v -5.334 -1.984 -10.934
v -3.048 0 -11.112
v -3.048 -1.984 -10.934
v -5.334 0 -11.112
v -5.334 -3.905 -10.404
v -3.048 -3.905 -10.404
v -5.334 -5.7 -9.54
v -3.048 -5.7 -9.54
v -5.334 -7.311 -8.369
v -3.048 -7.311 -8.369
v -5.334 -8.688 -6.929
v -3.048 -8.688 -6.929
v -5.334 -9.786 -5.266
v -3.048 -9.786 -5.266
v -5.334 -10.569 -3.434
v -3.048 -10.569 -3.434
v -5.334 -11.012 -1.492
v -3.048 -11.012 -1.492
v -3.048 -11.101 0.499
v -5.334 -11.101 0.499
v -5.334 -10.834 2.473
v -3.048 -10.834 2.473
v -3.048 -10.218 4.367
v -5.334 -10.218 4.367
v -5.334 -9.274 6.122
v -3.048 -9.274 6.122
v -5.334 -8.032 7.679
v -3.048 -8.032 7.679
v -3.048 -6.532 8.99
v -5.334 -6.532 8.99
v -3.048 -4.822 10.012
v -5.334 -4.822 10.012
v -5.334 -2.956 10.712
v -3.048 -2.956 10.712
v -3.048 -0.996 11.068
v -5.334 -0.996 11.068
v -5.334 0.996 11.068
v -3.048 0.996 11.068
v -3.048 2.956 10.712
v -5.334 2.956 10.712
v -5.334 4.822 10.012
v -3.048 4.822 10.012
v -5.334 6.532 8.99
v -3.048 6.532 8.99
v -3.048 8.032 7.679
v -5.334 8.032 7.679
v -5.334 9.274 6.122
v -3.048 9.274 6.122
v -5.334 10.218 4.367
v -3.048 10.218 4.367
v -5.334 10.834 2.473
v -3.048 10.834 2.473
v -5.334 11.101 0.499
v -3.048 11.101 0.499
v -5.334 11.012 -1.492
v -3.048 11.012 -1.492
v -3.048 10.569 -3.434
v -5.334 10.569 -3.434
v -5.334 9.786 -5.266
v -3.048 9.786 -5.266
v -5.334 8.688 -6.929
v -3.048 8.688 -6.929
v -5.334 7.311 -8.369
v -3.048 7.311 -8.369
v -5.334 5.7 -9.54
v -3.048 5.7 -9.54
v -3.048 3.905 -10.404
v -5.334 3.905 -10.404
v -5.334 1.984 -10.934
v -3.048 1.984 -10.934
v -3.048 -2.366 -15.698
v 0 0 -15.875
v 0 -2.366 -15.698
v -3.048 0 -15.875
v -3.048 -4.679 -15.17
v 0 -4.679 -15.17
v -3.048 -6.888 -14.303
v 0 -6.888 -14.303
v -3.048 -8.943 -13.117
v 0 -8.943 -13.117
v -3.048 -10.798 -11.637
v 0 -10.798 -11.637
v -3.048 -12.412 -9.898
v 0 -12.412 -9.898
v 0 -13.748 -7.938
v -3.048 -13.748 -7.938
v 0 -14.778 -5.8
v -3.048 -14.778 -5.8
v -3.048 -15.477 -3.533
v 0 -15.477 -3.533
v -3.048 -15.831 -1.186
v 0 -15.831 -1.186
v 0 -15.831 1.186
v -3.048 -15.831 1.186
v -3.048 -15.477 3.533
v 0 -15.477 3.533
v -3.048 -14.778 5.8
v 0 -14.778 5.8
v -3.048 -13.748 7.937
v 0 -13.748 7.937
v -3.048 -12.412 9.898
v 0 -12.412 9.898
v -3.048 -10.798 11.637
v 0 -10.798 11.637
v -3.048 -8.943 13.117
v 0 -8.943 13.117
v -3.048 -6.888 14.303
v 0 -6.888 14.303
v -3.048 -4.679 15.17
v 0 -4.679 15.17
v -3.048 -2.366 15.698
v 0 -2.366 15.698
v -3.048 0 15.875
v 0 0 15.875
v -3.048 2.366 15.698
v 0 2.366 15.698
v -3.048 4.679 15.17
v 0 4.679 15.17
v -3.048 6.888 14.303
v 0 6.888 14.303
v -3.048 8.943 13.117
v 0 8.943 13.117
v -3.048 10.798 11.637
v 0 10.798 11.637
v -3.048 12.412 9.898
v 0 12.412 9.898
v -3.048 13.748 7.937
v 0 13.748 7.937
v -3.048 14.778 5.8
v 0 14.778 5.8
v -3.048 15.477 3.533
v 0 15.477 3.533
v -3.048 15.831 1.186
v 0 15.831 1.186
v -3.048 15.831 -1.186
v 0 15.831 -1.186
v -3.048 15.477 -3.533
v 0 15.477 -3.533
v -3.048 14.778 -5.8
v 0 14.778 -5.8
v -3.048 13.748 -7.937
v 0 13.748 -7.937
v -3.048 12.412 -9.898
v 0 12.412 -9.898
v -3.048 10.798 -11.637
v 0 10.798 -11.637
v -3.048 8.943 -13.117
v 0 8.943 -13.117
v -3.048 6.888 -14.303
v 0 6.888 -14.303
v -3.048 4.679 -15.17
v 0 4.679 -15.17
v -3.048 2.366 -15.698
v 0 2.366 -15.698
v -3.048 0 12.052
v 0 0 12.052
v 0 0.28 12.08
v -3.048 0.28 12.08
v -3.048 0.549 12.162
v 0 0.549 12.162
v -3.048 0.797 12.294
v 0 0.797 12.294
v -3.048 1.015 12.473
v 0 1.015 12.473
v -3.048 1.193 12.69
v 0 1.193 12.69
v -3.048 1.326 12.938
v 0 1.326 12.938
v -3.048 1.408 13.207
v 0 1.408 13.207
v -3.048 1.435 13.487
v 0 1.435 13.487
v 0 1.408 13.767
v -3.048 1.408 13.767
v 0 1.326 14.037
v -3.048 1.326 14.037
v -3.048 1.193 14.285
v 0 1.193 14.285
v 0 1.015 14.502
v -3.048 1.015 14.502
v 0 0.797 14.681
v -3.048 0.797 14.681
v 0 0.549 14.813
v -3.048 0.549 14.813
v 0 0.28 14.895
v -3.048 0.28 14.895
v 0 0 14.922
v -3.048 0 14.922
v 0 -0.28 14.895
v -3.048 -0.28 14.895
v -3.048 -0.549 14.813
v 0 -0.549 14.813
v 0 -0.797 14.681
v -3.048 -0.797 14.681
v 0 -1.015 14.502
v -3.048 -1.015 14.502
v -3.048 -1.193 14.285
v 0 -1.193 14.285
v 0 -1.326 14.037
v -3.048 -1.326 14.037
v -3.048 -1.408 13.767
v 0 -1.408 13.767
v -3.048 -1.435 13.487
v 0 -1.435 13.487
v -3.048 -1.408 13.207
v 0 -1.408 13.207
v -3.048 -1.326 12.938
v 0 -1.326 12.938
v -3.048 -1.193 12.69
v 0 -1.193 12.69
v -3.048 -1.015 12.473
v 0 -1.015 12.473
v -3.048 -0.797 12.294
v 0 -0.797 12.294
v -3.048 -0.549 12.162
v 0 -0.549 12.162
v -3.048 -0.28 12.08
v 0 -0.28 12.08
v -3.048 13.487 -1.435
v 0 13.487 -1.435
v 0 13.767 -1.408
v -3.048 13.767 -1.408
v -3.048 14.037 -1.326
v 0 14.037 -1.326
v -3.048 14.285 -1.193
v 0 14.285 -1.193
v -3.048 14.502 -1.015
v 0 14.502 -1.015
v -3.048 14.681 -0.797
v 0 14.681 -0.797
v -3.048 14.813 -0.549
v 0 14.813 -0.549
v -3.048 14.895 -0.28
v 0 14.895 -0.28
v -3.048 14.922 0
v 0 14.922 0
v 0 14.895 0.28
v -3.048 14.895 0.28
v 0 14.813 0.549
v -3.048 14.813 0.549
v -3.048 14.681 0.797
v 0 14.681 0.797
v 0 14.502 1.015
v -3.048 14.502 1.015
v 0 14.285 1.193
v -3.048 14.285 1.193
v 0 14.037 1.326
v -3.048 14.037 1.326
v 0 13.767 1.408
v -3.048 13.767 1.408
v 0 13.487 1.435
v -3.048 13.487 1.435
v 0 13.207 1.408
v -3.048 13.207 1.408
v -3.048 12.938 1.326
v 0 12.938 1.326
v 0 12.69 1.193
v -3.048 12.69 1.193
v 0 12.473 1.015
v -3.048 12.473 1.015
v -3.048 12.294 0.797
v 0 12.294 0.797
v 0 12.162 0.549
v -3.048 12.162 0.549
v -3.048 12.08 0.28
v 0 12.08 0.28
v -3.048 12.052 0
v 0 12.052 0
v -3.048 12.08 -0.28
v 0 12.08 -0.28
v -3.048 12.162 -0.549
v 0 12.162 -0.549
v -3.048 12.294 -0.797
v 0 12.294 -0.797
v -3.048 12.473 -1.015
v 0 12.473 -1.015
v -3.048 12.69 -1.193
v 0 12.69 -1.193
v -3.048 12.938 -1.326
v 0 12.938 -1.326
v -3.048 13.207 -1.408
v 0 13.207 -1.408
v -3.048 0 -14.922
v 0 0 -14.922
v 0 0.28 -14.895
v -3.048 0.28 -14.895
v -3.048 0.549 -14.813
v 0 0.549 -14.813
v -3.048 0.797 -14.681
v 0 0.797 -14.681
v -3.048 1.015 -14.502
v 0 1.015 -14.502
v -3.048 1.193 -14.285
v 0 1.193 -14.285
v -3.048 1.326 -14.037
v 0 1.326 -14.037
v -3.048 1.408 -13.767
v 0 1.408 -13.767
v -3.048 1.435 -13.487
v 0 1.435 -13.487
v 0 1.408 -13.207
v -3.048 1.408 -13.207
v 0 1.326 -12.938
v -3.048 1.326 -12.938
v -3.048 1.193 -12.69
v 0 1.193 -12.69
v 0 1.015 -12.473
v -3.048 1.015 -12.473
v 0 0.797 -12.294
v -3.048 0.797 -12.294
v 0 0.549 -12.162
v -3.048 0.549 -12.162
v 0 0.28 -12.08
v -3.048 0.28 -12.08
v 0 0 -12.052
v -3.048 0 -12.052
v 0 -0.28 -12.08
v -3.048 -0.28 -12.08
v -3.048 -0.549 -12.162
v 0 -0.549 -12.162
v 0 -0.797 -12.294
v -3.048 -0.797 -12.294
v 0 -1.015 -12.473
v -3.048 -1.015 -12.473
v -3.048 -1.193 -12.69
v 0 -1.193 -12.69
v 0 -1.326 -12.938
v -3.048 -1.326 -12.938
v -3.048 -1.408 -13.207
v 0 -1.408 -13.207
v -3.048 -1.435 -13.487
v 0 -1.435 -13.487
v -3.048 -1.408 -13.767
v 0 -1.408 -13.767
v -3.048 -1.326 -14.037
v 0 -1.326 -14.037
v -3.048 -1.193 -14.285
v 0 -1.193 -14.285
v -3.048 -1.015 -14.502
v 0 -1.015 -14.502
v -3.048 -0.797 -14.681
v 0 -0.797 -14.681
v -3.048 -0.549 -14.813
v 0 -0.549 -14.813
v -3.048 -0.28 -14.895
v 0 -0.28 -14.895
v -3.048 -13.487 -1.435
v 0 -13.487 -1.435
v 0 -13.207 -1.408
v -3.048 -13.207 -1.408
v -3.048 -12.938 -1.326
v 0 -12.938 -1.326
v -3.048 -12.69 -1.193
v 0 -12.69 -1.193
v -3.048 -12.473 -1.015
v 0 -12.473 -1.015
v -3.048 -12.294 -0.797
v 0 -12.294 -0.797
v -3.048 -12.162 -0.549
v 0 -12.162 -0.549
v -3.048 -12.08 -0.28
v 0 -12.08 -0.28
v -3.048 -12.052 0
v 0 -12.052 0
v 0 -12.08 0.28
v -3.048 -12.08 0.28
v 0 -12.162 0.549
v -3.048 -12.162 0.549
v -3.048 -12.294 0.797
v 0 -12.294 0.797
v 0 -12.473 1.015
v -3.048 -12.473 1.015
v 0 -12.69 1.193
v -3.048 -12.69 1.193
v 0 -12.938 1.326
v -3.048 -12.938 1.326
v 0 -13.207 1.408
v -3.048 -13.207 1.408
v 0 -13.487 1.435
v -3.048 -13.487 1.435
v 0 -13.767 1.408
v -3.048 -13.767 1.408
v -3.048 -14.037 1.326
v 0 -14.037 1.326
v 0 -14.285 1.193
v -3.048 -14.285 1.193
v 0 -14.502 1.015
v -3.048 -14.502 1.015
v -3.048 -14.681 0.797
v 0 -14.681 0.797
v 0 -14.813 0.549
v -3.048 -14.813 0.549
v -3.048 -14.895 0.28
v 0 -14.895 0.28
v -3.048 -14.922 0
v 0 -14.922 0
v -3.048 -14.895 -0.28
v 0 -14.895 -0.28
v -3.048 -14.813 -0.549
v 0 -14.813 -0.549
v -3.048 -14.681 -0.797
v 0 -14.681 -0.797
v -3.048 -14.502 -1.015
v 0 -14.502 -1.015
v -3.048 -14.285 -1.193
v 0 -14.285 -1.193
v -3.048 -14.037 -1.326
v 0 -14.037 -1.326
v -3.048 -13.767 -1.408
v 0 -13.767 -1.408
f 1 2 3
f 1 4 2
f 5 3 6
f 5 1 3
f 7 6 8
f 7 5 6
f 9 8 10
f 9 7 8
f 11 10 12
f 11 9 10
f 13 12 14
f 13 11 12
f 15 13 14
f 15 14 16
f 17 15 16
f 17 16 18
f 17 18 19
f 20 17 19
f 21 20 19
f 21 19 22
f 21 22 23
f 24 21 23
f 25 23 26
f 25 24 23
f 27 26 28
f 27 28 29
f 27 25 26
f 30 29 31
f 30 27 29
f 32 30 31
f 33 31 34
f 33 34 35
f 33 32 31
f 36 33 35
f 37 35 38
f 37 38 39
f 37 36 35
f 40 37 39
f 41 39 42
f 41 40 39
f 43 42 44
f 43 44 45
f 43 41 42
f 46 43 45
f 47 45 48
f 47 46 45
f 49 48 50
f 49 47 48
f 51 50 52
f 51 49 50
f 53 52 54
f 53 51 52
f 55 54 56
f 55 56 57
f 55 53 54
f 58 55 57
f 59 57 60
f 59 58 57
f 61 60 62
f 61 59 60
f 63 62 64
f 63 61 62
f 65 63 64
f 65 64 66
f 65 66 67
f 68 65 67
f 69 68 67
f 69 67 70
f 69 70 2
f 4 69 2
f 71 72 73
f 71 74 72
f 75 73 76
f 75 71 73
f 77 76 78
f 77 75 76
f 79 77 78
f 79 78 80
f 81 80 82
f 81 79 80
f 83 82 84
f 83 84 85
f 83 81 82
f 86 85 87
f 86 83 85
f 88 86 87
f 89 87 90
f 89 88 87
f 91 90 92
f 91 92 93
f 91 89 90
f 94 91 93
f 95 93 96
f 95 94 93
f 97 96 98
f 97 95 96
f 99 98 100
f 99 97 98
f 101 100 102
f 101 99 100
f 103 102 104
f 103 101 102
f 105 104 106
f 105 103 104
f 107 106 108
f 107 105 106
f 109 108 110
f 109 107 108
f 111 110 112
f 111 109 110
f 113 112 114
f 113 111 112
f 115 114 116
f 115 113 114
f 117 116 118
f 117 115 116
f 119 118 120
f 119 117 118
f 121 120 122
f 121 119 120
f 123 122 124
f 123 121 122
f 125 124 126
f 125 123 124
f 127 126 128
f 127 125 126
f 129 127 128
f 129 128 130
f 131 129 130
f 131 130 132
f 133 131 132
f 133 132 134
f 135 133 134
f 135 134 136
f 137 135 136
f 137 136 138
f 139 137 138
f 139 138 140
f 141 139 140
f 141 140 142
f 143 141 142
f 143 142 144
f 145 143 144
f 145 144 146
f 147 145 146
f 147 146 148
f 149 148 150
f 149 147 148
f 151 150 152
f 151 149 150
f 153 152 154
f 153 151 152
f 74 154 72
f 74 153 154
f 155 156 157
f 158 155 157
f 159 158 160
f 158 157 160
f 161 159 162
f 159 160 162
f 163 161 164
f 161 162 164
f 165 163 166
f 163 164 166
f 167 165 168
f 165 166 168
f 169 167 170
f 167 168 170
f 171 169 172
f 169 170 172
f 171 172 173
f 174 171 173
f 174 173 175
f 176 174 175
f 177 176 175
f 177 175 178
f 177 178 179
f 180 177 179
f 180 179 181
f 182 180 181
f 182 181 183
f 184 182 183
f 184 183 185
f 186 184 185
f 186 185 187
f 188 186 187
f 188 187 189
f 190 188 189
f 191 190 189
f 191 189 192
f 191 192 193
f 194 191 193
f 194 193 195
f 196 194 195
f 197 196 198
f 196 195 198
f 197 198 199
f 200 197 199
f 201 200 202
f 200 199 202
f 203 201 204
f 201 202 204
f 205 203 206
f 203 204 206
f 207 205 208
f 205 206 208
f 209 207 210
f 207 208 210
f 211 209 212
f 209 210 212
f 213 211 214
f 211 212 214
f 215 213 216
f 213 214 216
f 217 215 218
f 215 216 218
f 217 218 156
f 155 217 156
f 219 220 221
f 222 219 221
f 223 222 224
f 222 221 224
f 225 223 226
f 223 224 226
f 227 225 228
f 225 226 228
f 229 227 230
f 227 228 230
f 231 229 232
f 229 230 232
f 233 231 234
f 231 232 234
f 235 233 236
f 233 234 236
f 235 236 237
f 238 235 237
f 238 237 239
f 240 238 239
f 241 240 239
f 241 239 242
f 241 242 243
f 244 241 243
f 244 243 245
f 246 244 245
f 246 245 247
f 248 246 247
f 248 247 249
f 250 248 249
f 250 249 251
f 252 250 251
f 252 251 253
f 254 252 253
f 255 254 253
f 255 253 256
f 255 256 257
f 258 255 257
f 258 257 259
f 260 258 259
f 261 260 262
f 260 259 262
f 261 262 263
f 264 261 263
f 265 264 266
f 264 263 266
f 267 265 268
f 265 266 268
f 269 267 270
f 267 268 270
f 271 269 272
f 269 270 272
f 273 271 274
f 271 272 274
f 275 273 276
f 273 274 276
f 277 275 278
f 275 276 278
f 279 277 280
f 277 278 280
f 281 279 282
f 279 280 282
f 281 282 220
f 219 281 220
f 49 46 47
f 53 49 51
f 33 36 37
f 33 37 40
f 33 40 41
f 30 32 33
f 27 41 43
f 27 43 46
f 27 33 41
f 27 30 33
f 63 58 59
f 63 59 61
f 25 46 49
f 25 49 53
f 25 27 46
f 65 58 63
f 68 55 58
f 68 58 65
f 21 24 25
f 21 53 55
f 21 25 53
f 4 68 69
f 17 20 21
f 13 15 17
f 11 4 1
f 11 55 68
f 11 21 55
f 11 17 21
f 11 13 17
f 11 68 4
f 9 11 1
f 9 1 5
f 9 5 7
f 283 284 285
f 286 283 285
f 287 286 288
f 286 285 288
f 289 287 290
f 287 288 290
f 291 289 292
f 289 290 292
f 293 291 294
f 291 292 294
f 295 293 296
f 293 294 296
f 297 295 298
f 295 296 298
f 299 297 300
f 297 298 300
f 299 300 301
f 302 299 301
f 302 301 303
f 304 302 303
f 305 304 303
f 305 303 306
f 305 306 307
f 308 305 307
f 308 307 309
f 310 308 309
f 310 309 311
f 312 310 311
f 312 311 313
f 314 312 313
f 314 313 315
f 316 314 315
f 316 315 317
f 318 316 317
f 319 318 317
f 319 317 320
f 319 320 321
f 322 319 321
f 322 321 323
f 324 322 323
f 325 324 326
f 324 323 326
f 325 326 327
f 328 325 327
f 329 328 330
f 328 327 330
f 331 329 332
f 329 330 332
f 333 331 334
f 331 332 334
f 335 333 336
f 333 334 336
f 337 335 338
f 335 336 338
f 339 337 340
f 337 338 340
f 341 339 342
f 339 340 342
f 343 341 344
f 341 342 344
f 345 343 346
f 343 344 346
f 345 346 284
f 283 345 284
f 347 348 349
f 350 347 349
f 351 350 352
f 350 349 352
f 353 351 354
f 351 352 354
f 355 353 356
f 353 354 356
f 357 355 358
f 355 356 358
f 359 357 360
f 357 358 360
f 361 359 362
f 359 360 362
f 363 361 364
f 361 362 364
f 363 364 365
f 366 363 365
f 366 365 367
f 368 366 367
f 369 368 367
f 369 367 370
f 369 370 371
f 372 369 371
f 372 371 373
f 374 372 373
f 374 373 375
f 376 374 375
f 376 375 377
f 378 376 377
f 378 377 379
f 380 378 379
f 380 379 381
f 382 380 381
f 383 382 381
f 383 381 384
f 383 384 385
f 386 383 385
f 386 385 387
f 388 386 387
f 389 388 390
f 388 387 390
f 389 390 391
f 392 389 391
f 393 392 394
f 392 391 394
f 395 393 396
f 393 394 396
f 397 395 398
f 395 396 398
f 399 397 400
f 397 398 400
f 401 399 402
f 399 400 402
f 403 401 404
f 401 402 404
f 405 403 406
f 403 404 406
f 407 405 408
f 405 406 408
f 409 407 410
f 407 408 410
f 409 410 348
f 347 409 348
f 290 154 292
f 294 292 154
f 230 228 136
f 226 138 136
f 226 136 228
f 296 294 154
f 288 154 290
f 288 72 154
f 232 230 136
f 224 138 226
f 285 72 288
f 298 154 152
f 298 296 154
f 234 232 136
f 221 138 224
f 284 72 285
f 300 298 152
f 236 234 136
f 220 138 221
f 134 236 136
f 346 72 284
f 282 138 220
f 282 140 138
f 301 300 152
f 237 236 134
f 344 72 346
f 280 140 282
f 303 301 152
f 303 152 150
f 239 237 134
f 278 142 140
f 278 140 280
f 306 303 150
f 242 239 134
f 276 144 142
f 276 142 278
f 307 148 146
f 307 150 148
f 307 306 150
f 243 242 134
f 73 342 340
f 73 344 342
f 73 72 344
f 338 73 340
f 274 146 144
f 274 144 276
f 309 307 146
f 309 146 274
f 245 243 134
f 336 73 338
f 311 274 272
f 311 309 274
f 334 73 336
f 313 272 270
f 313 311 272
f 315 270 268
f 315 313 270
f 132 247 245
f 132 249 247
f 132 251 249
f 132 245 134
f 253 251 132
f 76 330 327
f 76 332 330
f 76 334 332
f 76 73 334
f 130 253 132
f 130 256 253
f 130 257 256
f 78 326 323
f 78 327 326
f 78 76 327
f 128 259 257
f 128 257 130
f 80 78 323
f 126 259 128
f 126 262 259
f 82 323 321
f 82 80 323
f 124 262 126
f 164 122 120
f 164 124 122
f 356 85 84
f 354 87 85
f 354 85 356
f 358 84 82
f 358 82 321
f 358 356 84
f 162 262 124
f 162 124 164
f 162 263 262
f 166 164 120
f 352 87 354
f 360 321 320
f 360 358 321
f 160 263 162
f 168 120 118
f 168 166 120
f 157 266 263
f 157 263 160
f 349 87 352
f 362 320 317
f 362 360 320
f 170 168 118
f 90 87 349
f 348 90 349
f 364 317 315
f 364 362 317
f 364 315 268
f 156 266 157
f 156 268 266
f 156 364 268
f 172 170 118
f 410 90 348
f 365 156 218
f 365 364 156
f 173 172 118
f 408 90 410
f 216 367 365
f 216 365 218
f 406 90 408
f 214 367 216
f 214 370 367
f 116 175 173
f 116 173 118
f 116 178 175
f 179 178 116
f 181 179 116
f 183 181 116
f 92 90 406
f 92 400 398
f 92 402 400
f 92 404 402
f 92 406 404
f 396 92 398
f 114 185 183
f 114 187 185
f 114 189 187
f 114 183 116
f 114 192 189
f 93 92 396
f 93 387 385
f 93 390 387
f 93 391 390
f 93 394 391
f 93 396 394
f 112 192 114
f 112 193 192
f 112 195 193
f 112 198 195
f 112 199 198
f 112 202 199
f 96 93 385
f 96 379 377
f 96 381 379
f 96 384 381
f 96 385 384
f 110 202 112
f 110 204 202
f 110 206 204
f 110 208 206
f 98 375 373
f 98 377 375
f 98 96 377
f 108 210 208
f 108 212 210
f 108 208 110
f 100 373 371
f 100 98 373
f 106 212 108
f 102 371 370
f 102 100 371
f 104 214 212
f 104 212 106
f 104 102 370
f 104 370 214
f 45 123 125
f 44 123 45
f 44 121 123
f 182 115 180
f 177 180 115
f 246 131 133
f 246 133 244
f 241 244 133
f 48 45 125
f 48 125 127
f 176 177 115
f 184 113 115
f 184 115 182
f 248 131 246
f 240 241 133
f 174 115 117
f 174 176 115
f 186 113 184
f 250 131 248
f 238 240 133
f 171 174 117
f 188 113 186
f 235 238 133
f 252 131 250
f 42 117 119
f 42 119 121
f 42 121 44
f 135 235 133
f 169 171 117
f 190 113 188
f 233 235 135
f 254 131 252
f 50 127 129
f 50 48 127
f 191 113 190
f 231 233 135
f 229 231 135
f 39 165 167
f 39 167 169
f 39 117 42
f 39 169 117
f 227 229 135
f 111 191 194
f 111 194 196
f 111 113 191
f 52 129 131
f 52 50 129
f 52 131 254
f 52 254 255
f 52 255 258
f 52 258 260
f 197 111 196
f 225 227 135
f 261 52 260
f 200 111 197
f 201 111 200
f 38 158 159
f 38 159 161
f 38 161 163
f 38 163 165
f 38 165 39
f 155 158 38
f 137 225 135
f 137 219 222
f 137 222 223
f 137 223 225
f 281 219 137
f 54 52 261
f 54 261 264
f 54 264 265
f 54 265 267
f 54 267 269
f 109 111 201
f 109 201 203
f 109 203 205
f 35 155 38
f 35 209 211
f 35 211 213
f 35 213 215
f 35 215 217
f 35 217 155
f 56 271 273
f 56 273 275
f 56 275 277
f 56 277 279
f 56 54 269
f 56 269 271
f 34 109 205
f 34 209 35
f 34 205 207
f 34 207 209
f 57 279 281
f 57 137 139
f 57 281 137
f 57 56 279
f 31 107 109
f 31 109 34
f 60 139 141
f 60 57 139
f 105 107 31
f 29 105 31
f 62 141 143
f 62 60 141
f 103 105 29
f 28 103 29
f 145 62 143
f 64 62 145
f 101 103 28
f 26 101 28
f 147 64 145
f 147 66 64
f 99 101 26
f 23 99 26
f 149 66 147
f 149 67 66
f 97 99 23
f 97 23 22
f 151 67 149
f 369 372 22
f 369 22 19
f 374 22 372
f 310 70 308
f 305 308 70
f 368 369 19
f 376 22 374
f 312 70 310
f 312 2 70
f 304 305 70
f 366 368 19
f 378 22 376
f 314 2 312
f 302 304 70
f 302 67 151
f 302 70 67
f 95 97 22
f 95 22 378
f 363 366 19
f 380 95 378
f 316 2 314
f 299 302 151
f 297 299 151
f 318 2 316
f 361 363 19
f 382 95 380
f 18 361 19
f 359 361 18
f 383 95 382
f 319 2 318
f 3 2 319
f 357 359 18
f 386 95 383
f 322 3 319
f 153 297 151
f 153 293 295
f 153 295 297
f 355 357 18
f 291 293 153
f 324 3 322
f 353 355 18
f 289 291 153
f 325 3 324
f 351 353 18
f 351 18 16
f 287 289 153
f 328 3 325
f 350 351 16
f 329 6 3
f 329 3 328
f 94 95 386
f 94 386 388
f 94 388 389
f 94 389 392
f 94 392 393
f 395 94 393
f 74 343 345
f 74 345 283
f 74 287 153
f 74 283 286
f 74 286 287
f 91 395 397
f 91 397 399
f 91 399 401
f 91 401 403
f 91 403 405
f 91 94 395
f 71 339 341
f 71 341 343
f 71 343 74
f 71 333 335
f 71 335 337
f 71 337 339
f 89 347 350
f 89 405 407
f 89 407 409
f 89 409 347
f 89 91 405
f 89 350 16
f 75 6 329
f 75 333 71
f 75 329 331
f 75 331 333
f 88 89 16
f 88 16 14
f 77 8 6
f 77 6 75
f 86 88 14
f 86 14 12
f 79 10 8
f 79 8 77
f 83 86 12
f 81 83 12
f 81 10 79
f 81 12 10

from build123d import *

# Parameters (mm, degrees)
SKETCH2_R          = 1.4351
CUT_EXTRUDE1_DEPTH = 24.075588963


with BuildPart() as part:
    # Sketch1 → Revolve1 (revolve)
    with BuildSketch(Plane.XY, mode=Mode.PRIVATE) as revolve1_sk:
        Polygon((0, 0), (0, 15.875), (-3.048, 15.875), (-3.048, 11.1125), (-5.334, 11.1125), (-5.334, 0), align=None)
    revolve(revolve1_sk.sketch.rotate(Axis((0, 0, 0), (-1, 0, 0)), 90), axis=Axis((0, 0, 0), (-1, 0, 0)))

    # Sketch2 → Cut-Extrude1 (cut, through all)
    with BuildSketch(Plane(origin=(0, 0, 0), x_dir=(0, 0, -1), z_dir=(1, 0, 0))):
        with Locations((0, 13.4874)):
            Circle(SKETCH2_R)
        with Locations((13.4874, 0)):
            Circle(SKETCH2_R)
        with Locations((0, -13.4874)):
            Circle(SKETCH2_R)
        with Locations((-13.4874, 0)):
            Circle(SKETCH2_R)
    extrude(amount=-CUT_EXTRUDE1_DEPTH, mode=Mode.SUBTRACT)


solid = part.part
